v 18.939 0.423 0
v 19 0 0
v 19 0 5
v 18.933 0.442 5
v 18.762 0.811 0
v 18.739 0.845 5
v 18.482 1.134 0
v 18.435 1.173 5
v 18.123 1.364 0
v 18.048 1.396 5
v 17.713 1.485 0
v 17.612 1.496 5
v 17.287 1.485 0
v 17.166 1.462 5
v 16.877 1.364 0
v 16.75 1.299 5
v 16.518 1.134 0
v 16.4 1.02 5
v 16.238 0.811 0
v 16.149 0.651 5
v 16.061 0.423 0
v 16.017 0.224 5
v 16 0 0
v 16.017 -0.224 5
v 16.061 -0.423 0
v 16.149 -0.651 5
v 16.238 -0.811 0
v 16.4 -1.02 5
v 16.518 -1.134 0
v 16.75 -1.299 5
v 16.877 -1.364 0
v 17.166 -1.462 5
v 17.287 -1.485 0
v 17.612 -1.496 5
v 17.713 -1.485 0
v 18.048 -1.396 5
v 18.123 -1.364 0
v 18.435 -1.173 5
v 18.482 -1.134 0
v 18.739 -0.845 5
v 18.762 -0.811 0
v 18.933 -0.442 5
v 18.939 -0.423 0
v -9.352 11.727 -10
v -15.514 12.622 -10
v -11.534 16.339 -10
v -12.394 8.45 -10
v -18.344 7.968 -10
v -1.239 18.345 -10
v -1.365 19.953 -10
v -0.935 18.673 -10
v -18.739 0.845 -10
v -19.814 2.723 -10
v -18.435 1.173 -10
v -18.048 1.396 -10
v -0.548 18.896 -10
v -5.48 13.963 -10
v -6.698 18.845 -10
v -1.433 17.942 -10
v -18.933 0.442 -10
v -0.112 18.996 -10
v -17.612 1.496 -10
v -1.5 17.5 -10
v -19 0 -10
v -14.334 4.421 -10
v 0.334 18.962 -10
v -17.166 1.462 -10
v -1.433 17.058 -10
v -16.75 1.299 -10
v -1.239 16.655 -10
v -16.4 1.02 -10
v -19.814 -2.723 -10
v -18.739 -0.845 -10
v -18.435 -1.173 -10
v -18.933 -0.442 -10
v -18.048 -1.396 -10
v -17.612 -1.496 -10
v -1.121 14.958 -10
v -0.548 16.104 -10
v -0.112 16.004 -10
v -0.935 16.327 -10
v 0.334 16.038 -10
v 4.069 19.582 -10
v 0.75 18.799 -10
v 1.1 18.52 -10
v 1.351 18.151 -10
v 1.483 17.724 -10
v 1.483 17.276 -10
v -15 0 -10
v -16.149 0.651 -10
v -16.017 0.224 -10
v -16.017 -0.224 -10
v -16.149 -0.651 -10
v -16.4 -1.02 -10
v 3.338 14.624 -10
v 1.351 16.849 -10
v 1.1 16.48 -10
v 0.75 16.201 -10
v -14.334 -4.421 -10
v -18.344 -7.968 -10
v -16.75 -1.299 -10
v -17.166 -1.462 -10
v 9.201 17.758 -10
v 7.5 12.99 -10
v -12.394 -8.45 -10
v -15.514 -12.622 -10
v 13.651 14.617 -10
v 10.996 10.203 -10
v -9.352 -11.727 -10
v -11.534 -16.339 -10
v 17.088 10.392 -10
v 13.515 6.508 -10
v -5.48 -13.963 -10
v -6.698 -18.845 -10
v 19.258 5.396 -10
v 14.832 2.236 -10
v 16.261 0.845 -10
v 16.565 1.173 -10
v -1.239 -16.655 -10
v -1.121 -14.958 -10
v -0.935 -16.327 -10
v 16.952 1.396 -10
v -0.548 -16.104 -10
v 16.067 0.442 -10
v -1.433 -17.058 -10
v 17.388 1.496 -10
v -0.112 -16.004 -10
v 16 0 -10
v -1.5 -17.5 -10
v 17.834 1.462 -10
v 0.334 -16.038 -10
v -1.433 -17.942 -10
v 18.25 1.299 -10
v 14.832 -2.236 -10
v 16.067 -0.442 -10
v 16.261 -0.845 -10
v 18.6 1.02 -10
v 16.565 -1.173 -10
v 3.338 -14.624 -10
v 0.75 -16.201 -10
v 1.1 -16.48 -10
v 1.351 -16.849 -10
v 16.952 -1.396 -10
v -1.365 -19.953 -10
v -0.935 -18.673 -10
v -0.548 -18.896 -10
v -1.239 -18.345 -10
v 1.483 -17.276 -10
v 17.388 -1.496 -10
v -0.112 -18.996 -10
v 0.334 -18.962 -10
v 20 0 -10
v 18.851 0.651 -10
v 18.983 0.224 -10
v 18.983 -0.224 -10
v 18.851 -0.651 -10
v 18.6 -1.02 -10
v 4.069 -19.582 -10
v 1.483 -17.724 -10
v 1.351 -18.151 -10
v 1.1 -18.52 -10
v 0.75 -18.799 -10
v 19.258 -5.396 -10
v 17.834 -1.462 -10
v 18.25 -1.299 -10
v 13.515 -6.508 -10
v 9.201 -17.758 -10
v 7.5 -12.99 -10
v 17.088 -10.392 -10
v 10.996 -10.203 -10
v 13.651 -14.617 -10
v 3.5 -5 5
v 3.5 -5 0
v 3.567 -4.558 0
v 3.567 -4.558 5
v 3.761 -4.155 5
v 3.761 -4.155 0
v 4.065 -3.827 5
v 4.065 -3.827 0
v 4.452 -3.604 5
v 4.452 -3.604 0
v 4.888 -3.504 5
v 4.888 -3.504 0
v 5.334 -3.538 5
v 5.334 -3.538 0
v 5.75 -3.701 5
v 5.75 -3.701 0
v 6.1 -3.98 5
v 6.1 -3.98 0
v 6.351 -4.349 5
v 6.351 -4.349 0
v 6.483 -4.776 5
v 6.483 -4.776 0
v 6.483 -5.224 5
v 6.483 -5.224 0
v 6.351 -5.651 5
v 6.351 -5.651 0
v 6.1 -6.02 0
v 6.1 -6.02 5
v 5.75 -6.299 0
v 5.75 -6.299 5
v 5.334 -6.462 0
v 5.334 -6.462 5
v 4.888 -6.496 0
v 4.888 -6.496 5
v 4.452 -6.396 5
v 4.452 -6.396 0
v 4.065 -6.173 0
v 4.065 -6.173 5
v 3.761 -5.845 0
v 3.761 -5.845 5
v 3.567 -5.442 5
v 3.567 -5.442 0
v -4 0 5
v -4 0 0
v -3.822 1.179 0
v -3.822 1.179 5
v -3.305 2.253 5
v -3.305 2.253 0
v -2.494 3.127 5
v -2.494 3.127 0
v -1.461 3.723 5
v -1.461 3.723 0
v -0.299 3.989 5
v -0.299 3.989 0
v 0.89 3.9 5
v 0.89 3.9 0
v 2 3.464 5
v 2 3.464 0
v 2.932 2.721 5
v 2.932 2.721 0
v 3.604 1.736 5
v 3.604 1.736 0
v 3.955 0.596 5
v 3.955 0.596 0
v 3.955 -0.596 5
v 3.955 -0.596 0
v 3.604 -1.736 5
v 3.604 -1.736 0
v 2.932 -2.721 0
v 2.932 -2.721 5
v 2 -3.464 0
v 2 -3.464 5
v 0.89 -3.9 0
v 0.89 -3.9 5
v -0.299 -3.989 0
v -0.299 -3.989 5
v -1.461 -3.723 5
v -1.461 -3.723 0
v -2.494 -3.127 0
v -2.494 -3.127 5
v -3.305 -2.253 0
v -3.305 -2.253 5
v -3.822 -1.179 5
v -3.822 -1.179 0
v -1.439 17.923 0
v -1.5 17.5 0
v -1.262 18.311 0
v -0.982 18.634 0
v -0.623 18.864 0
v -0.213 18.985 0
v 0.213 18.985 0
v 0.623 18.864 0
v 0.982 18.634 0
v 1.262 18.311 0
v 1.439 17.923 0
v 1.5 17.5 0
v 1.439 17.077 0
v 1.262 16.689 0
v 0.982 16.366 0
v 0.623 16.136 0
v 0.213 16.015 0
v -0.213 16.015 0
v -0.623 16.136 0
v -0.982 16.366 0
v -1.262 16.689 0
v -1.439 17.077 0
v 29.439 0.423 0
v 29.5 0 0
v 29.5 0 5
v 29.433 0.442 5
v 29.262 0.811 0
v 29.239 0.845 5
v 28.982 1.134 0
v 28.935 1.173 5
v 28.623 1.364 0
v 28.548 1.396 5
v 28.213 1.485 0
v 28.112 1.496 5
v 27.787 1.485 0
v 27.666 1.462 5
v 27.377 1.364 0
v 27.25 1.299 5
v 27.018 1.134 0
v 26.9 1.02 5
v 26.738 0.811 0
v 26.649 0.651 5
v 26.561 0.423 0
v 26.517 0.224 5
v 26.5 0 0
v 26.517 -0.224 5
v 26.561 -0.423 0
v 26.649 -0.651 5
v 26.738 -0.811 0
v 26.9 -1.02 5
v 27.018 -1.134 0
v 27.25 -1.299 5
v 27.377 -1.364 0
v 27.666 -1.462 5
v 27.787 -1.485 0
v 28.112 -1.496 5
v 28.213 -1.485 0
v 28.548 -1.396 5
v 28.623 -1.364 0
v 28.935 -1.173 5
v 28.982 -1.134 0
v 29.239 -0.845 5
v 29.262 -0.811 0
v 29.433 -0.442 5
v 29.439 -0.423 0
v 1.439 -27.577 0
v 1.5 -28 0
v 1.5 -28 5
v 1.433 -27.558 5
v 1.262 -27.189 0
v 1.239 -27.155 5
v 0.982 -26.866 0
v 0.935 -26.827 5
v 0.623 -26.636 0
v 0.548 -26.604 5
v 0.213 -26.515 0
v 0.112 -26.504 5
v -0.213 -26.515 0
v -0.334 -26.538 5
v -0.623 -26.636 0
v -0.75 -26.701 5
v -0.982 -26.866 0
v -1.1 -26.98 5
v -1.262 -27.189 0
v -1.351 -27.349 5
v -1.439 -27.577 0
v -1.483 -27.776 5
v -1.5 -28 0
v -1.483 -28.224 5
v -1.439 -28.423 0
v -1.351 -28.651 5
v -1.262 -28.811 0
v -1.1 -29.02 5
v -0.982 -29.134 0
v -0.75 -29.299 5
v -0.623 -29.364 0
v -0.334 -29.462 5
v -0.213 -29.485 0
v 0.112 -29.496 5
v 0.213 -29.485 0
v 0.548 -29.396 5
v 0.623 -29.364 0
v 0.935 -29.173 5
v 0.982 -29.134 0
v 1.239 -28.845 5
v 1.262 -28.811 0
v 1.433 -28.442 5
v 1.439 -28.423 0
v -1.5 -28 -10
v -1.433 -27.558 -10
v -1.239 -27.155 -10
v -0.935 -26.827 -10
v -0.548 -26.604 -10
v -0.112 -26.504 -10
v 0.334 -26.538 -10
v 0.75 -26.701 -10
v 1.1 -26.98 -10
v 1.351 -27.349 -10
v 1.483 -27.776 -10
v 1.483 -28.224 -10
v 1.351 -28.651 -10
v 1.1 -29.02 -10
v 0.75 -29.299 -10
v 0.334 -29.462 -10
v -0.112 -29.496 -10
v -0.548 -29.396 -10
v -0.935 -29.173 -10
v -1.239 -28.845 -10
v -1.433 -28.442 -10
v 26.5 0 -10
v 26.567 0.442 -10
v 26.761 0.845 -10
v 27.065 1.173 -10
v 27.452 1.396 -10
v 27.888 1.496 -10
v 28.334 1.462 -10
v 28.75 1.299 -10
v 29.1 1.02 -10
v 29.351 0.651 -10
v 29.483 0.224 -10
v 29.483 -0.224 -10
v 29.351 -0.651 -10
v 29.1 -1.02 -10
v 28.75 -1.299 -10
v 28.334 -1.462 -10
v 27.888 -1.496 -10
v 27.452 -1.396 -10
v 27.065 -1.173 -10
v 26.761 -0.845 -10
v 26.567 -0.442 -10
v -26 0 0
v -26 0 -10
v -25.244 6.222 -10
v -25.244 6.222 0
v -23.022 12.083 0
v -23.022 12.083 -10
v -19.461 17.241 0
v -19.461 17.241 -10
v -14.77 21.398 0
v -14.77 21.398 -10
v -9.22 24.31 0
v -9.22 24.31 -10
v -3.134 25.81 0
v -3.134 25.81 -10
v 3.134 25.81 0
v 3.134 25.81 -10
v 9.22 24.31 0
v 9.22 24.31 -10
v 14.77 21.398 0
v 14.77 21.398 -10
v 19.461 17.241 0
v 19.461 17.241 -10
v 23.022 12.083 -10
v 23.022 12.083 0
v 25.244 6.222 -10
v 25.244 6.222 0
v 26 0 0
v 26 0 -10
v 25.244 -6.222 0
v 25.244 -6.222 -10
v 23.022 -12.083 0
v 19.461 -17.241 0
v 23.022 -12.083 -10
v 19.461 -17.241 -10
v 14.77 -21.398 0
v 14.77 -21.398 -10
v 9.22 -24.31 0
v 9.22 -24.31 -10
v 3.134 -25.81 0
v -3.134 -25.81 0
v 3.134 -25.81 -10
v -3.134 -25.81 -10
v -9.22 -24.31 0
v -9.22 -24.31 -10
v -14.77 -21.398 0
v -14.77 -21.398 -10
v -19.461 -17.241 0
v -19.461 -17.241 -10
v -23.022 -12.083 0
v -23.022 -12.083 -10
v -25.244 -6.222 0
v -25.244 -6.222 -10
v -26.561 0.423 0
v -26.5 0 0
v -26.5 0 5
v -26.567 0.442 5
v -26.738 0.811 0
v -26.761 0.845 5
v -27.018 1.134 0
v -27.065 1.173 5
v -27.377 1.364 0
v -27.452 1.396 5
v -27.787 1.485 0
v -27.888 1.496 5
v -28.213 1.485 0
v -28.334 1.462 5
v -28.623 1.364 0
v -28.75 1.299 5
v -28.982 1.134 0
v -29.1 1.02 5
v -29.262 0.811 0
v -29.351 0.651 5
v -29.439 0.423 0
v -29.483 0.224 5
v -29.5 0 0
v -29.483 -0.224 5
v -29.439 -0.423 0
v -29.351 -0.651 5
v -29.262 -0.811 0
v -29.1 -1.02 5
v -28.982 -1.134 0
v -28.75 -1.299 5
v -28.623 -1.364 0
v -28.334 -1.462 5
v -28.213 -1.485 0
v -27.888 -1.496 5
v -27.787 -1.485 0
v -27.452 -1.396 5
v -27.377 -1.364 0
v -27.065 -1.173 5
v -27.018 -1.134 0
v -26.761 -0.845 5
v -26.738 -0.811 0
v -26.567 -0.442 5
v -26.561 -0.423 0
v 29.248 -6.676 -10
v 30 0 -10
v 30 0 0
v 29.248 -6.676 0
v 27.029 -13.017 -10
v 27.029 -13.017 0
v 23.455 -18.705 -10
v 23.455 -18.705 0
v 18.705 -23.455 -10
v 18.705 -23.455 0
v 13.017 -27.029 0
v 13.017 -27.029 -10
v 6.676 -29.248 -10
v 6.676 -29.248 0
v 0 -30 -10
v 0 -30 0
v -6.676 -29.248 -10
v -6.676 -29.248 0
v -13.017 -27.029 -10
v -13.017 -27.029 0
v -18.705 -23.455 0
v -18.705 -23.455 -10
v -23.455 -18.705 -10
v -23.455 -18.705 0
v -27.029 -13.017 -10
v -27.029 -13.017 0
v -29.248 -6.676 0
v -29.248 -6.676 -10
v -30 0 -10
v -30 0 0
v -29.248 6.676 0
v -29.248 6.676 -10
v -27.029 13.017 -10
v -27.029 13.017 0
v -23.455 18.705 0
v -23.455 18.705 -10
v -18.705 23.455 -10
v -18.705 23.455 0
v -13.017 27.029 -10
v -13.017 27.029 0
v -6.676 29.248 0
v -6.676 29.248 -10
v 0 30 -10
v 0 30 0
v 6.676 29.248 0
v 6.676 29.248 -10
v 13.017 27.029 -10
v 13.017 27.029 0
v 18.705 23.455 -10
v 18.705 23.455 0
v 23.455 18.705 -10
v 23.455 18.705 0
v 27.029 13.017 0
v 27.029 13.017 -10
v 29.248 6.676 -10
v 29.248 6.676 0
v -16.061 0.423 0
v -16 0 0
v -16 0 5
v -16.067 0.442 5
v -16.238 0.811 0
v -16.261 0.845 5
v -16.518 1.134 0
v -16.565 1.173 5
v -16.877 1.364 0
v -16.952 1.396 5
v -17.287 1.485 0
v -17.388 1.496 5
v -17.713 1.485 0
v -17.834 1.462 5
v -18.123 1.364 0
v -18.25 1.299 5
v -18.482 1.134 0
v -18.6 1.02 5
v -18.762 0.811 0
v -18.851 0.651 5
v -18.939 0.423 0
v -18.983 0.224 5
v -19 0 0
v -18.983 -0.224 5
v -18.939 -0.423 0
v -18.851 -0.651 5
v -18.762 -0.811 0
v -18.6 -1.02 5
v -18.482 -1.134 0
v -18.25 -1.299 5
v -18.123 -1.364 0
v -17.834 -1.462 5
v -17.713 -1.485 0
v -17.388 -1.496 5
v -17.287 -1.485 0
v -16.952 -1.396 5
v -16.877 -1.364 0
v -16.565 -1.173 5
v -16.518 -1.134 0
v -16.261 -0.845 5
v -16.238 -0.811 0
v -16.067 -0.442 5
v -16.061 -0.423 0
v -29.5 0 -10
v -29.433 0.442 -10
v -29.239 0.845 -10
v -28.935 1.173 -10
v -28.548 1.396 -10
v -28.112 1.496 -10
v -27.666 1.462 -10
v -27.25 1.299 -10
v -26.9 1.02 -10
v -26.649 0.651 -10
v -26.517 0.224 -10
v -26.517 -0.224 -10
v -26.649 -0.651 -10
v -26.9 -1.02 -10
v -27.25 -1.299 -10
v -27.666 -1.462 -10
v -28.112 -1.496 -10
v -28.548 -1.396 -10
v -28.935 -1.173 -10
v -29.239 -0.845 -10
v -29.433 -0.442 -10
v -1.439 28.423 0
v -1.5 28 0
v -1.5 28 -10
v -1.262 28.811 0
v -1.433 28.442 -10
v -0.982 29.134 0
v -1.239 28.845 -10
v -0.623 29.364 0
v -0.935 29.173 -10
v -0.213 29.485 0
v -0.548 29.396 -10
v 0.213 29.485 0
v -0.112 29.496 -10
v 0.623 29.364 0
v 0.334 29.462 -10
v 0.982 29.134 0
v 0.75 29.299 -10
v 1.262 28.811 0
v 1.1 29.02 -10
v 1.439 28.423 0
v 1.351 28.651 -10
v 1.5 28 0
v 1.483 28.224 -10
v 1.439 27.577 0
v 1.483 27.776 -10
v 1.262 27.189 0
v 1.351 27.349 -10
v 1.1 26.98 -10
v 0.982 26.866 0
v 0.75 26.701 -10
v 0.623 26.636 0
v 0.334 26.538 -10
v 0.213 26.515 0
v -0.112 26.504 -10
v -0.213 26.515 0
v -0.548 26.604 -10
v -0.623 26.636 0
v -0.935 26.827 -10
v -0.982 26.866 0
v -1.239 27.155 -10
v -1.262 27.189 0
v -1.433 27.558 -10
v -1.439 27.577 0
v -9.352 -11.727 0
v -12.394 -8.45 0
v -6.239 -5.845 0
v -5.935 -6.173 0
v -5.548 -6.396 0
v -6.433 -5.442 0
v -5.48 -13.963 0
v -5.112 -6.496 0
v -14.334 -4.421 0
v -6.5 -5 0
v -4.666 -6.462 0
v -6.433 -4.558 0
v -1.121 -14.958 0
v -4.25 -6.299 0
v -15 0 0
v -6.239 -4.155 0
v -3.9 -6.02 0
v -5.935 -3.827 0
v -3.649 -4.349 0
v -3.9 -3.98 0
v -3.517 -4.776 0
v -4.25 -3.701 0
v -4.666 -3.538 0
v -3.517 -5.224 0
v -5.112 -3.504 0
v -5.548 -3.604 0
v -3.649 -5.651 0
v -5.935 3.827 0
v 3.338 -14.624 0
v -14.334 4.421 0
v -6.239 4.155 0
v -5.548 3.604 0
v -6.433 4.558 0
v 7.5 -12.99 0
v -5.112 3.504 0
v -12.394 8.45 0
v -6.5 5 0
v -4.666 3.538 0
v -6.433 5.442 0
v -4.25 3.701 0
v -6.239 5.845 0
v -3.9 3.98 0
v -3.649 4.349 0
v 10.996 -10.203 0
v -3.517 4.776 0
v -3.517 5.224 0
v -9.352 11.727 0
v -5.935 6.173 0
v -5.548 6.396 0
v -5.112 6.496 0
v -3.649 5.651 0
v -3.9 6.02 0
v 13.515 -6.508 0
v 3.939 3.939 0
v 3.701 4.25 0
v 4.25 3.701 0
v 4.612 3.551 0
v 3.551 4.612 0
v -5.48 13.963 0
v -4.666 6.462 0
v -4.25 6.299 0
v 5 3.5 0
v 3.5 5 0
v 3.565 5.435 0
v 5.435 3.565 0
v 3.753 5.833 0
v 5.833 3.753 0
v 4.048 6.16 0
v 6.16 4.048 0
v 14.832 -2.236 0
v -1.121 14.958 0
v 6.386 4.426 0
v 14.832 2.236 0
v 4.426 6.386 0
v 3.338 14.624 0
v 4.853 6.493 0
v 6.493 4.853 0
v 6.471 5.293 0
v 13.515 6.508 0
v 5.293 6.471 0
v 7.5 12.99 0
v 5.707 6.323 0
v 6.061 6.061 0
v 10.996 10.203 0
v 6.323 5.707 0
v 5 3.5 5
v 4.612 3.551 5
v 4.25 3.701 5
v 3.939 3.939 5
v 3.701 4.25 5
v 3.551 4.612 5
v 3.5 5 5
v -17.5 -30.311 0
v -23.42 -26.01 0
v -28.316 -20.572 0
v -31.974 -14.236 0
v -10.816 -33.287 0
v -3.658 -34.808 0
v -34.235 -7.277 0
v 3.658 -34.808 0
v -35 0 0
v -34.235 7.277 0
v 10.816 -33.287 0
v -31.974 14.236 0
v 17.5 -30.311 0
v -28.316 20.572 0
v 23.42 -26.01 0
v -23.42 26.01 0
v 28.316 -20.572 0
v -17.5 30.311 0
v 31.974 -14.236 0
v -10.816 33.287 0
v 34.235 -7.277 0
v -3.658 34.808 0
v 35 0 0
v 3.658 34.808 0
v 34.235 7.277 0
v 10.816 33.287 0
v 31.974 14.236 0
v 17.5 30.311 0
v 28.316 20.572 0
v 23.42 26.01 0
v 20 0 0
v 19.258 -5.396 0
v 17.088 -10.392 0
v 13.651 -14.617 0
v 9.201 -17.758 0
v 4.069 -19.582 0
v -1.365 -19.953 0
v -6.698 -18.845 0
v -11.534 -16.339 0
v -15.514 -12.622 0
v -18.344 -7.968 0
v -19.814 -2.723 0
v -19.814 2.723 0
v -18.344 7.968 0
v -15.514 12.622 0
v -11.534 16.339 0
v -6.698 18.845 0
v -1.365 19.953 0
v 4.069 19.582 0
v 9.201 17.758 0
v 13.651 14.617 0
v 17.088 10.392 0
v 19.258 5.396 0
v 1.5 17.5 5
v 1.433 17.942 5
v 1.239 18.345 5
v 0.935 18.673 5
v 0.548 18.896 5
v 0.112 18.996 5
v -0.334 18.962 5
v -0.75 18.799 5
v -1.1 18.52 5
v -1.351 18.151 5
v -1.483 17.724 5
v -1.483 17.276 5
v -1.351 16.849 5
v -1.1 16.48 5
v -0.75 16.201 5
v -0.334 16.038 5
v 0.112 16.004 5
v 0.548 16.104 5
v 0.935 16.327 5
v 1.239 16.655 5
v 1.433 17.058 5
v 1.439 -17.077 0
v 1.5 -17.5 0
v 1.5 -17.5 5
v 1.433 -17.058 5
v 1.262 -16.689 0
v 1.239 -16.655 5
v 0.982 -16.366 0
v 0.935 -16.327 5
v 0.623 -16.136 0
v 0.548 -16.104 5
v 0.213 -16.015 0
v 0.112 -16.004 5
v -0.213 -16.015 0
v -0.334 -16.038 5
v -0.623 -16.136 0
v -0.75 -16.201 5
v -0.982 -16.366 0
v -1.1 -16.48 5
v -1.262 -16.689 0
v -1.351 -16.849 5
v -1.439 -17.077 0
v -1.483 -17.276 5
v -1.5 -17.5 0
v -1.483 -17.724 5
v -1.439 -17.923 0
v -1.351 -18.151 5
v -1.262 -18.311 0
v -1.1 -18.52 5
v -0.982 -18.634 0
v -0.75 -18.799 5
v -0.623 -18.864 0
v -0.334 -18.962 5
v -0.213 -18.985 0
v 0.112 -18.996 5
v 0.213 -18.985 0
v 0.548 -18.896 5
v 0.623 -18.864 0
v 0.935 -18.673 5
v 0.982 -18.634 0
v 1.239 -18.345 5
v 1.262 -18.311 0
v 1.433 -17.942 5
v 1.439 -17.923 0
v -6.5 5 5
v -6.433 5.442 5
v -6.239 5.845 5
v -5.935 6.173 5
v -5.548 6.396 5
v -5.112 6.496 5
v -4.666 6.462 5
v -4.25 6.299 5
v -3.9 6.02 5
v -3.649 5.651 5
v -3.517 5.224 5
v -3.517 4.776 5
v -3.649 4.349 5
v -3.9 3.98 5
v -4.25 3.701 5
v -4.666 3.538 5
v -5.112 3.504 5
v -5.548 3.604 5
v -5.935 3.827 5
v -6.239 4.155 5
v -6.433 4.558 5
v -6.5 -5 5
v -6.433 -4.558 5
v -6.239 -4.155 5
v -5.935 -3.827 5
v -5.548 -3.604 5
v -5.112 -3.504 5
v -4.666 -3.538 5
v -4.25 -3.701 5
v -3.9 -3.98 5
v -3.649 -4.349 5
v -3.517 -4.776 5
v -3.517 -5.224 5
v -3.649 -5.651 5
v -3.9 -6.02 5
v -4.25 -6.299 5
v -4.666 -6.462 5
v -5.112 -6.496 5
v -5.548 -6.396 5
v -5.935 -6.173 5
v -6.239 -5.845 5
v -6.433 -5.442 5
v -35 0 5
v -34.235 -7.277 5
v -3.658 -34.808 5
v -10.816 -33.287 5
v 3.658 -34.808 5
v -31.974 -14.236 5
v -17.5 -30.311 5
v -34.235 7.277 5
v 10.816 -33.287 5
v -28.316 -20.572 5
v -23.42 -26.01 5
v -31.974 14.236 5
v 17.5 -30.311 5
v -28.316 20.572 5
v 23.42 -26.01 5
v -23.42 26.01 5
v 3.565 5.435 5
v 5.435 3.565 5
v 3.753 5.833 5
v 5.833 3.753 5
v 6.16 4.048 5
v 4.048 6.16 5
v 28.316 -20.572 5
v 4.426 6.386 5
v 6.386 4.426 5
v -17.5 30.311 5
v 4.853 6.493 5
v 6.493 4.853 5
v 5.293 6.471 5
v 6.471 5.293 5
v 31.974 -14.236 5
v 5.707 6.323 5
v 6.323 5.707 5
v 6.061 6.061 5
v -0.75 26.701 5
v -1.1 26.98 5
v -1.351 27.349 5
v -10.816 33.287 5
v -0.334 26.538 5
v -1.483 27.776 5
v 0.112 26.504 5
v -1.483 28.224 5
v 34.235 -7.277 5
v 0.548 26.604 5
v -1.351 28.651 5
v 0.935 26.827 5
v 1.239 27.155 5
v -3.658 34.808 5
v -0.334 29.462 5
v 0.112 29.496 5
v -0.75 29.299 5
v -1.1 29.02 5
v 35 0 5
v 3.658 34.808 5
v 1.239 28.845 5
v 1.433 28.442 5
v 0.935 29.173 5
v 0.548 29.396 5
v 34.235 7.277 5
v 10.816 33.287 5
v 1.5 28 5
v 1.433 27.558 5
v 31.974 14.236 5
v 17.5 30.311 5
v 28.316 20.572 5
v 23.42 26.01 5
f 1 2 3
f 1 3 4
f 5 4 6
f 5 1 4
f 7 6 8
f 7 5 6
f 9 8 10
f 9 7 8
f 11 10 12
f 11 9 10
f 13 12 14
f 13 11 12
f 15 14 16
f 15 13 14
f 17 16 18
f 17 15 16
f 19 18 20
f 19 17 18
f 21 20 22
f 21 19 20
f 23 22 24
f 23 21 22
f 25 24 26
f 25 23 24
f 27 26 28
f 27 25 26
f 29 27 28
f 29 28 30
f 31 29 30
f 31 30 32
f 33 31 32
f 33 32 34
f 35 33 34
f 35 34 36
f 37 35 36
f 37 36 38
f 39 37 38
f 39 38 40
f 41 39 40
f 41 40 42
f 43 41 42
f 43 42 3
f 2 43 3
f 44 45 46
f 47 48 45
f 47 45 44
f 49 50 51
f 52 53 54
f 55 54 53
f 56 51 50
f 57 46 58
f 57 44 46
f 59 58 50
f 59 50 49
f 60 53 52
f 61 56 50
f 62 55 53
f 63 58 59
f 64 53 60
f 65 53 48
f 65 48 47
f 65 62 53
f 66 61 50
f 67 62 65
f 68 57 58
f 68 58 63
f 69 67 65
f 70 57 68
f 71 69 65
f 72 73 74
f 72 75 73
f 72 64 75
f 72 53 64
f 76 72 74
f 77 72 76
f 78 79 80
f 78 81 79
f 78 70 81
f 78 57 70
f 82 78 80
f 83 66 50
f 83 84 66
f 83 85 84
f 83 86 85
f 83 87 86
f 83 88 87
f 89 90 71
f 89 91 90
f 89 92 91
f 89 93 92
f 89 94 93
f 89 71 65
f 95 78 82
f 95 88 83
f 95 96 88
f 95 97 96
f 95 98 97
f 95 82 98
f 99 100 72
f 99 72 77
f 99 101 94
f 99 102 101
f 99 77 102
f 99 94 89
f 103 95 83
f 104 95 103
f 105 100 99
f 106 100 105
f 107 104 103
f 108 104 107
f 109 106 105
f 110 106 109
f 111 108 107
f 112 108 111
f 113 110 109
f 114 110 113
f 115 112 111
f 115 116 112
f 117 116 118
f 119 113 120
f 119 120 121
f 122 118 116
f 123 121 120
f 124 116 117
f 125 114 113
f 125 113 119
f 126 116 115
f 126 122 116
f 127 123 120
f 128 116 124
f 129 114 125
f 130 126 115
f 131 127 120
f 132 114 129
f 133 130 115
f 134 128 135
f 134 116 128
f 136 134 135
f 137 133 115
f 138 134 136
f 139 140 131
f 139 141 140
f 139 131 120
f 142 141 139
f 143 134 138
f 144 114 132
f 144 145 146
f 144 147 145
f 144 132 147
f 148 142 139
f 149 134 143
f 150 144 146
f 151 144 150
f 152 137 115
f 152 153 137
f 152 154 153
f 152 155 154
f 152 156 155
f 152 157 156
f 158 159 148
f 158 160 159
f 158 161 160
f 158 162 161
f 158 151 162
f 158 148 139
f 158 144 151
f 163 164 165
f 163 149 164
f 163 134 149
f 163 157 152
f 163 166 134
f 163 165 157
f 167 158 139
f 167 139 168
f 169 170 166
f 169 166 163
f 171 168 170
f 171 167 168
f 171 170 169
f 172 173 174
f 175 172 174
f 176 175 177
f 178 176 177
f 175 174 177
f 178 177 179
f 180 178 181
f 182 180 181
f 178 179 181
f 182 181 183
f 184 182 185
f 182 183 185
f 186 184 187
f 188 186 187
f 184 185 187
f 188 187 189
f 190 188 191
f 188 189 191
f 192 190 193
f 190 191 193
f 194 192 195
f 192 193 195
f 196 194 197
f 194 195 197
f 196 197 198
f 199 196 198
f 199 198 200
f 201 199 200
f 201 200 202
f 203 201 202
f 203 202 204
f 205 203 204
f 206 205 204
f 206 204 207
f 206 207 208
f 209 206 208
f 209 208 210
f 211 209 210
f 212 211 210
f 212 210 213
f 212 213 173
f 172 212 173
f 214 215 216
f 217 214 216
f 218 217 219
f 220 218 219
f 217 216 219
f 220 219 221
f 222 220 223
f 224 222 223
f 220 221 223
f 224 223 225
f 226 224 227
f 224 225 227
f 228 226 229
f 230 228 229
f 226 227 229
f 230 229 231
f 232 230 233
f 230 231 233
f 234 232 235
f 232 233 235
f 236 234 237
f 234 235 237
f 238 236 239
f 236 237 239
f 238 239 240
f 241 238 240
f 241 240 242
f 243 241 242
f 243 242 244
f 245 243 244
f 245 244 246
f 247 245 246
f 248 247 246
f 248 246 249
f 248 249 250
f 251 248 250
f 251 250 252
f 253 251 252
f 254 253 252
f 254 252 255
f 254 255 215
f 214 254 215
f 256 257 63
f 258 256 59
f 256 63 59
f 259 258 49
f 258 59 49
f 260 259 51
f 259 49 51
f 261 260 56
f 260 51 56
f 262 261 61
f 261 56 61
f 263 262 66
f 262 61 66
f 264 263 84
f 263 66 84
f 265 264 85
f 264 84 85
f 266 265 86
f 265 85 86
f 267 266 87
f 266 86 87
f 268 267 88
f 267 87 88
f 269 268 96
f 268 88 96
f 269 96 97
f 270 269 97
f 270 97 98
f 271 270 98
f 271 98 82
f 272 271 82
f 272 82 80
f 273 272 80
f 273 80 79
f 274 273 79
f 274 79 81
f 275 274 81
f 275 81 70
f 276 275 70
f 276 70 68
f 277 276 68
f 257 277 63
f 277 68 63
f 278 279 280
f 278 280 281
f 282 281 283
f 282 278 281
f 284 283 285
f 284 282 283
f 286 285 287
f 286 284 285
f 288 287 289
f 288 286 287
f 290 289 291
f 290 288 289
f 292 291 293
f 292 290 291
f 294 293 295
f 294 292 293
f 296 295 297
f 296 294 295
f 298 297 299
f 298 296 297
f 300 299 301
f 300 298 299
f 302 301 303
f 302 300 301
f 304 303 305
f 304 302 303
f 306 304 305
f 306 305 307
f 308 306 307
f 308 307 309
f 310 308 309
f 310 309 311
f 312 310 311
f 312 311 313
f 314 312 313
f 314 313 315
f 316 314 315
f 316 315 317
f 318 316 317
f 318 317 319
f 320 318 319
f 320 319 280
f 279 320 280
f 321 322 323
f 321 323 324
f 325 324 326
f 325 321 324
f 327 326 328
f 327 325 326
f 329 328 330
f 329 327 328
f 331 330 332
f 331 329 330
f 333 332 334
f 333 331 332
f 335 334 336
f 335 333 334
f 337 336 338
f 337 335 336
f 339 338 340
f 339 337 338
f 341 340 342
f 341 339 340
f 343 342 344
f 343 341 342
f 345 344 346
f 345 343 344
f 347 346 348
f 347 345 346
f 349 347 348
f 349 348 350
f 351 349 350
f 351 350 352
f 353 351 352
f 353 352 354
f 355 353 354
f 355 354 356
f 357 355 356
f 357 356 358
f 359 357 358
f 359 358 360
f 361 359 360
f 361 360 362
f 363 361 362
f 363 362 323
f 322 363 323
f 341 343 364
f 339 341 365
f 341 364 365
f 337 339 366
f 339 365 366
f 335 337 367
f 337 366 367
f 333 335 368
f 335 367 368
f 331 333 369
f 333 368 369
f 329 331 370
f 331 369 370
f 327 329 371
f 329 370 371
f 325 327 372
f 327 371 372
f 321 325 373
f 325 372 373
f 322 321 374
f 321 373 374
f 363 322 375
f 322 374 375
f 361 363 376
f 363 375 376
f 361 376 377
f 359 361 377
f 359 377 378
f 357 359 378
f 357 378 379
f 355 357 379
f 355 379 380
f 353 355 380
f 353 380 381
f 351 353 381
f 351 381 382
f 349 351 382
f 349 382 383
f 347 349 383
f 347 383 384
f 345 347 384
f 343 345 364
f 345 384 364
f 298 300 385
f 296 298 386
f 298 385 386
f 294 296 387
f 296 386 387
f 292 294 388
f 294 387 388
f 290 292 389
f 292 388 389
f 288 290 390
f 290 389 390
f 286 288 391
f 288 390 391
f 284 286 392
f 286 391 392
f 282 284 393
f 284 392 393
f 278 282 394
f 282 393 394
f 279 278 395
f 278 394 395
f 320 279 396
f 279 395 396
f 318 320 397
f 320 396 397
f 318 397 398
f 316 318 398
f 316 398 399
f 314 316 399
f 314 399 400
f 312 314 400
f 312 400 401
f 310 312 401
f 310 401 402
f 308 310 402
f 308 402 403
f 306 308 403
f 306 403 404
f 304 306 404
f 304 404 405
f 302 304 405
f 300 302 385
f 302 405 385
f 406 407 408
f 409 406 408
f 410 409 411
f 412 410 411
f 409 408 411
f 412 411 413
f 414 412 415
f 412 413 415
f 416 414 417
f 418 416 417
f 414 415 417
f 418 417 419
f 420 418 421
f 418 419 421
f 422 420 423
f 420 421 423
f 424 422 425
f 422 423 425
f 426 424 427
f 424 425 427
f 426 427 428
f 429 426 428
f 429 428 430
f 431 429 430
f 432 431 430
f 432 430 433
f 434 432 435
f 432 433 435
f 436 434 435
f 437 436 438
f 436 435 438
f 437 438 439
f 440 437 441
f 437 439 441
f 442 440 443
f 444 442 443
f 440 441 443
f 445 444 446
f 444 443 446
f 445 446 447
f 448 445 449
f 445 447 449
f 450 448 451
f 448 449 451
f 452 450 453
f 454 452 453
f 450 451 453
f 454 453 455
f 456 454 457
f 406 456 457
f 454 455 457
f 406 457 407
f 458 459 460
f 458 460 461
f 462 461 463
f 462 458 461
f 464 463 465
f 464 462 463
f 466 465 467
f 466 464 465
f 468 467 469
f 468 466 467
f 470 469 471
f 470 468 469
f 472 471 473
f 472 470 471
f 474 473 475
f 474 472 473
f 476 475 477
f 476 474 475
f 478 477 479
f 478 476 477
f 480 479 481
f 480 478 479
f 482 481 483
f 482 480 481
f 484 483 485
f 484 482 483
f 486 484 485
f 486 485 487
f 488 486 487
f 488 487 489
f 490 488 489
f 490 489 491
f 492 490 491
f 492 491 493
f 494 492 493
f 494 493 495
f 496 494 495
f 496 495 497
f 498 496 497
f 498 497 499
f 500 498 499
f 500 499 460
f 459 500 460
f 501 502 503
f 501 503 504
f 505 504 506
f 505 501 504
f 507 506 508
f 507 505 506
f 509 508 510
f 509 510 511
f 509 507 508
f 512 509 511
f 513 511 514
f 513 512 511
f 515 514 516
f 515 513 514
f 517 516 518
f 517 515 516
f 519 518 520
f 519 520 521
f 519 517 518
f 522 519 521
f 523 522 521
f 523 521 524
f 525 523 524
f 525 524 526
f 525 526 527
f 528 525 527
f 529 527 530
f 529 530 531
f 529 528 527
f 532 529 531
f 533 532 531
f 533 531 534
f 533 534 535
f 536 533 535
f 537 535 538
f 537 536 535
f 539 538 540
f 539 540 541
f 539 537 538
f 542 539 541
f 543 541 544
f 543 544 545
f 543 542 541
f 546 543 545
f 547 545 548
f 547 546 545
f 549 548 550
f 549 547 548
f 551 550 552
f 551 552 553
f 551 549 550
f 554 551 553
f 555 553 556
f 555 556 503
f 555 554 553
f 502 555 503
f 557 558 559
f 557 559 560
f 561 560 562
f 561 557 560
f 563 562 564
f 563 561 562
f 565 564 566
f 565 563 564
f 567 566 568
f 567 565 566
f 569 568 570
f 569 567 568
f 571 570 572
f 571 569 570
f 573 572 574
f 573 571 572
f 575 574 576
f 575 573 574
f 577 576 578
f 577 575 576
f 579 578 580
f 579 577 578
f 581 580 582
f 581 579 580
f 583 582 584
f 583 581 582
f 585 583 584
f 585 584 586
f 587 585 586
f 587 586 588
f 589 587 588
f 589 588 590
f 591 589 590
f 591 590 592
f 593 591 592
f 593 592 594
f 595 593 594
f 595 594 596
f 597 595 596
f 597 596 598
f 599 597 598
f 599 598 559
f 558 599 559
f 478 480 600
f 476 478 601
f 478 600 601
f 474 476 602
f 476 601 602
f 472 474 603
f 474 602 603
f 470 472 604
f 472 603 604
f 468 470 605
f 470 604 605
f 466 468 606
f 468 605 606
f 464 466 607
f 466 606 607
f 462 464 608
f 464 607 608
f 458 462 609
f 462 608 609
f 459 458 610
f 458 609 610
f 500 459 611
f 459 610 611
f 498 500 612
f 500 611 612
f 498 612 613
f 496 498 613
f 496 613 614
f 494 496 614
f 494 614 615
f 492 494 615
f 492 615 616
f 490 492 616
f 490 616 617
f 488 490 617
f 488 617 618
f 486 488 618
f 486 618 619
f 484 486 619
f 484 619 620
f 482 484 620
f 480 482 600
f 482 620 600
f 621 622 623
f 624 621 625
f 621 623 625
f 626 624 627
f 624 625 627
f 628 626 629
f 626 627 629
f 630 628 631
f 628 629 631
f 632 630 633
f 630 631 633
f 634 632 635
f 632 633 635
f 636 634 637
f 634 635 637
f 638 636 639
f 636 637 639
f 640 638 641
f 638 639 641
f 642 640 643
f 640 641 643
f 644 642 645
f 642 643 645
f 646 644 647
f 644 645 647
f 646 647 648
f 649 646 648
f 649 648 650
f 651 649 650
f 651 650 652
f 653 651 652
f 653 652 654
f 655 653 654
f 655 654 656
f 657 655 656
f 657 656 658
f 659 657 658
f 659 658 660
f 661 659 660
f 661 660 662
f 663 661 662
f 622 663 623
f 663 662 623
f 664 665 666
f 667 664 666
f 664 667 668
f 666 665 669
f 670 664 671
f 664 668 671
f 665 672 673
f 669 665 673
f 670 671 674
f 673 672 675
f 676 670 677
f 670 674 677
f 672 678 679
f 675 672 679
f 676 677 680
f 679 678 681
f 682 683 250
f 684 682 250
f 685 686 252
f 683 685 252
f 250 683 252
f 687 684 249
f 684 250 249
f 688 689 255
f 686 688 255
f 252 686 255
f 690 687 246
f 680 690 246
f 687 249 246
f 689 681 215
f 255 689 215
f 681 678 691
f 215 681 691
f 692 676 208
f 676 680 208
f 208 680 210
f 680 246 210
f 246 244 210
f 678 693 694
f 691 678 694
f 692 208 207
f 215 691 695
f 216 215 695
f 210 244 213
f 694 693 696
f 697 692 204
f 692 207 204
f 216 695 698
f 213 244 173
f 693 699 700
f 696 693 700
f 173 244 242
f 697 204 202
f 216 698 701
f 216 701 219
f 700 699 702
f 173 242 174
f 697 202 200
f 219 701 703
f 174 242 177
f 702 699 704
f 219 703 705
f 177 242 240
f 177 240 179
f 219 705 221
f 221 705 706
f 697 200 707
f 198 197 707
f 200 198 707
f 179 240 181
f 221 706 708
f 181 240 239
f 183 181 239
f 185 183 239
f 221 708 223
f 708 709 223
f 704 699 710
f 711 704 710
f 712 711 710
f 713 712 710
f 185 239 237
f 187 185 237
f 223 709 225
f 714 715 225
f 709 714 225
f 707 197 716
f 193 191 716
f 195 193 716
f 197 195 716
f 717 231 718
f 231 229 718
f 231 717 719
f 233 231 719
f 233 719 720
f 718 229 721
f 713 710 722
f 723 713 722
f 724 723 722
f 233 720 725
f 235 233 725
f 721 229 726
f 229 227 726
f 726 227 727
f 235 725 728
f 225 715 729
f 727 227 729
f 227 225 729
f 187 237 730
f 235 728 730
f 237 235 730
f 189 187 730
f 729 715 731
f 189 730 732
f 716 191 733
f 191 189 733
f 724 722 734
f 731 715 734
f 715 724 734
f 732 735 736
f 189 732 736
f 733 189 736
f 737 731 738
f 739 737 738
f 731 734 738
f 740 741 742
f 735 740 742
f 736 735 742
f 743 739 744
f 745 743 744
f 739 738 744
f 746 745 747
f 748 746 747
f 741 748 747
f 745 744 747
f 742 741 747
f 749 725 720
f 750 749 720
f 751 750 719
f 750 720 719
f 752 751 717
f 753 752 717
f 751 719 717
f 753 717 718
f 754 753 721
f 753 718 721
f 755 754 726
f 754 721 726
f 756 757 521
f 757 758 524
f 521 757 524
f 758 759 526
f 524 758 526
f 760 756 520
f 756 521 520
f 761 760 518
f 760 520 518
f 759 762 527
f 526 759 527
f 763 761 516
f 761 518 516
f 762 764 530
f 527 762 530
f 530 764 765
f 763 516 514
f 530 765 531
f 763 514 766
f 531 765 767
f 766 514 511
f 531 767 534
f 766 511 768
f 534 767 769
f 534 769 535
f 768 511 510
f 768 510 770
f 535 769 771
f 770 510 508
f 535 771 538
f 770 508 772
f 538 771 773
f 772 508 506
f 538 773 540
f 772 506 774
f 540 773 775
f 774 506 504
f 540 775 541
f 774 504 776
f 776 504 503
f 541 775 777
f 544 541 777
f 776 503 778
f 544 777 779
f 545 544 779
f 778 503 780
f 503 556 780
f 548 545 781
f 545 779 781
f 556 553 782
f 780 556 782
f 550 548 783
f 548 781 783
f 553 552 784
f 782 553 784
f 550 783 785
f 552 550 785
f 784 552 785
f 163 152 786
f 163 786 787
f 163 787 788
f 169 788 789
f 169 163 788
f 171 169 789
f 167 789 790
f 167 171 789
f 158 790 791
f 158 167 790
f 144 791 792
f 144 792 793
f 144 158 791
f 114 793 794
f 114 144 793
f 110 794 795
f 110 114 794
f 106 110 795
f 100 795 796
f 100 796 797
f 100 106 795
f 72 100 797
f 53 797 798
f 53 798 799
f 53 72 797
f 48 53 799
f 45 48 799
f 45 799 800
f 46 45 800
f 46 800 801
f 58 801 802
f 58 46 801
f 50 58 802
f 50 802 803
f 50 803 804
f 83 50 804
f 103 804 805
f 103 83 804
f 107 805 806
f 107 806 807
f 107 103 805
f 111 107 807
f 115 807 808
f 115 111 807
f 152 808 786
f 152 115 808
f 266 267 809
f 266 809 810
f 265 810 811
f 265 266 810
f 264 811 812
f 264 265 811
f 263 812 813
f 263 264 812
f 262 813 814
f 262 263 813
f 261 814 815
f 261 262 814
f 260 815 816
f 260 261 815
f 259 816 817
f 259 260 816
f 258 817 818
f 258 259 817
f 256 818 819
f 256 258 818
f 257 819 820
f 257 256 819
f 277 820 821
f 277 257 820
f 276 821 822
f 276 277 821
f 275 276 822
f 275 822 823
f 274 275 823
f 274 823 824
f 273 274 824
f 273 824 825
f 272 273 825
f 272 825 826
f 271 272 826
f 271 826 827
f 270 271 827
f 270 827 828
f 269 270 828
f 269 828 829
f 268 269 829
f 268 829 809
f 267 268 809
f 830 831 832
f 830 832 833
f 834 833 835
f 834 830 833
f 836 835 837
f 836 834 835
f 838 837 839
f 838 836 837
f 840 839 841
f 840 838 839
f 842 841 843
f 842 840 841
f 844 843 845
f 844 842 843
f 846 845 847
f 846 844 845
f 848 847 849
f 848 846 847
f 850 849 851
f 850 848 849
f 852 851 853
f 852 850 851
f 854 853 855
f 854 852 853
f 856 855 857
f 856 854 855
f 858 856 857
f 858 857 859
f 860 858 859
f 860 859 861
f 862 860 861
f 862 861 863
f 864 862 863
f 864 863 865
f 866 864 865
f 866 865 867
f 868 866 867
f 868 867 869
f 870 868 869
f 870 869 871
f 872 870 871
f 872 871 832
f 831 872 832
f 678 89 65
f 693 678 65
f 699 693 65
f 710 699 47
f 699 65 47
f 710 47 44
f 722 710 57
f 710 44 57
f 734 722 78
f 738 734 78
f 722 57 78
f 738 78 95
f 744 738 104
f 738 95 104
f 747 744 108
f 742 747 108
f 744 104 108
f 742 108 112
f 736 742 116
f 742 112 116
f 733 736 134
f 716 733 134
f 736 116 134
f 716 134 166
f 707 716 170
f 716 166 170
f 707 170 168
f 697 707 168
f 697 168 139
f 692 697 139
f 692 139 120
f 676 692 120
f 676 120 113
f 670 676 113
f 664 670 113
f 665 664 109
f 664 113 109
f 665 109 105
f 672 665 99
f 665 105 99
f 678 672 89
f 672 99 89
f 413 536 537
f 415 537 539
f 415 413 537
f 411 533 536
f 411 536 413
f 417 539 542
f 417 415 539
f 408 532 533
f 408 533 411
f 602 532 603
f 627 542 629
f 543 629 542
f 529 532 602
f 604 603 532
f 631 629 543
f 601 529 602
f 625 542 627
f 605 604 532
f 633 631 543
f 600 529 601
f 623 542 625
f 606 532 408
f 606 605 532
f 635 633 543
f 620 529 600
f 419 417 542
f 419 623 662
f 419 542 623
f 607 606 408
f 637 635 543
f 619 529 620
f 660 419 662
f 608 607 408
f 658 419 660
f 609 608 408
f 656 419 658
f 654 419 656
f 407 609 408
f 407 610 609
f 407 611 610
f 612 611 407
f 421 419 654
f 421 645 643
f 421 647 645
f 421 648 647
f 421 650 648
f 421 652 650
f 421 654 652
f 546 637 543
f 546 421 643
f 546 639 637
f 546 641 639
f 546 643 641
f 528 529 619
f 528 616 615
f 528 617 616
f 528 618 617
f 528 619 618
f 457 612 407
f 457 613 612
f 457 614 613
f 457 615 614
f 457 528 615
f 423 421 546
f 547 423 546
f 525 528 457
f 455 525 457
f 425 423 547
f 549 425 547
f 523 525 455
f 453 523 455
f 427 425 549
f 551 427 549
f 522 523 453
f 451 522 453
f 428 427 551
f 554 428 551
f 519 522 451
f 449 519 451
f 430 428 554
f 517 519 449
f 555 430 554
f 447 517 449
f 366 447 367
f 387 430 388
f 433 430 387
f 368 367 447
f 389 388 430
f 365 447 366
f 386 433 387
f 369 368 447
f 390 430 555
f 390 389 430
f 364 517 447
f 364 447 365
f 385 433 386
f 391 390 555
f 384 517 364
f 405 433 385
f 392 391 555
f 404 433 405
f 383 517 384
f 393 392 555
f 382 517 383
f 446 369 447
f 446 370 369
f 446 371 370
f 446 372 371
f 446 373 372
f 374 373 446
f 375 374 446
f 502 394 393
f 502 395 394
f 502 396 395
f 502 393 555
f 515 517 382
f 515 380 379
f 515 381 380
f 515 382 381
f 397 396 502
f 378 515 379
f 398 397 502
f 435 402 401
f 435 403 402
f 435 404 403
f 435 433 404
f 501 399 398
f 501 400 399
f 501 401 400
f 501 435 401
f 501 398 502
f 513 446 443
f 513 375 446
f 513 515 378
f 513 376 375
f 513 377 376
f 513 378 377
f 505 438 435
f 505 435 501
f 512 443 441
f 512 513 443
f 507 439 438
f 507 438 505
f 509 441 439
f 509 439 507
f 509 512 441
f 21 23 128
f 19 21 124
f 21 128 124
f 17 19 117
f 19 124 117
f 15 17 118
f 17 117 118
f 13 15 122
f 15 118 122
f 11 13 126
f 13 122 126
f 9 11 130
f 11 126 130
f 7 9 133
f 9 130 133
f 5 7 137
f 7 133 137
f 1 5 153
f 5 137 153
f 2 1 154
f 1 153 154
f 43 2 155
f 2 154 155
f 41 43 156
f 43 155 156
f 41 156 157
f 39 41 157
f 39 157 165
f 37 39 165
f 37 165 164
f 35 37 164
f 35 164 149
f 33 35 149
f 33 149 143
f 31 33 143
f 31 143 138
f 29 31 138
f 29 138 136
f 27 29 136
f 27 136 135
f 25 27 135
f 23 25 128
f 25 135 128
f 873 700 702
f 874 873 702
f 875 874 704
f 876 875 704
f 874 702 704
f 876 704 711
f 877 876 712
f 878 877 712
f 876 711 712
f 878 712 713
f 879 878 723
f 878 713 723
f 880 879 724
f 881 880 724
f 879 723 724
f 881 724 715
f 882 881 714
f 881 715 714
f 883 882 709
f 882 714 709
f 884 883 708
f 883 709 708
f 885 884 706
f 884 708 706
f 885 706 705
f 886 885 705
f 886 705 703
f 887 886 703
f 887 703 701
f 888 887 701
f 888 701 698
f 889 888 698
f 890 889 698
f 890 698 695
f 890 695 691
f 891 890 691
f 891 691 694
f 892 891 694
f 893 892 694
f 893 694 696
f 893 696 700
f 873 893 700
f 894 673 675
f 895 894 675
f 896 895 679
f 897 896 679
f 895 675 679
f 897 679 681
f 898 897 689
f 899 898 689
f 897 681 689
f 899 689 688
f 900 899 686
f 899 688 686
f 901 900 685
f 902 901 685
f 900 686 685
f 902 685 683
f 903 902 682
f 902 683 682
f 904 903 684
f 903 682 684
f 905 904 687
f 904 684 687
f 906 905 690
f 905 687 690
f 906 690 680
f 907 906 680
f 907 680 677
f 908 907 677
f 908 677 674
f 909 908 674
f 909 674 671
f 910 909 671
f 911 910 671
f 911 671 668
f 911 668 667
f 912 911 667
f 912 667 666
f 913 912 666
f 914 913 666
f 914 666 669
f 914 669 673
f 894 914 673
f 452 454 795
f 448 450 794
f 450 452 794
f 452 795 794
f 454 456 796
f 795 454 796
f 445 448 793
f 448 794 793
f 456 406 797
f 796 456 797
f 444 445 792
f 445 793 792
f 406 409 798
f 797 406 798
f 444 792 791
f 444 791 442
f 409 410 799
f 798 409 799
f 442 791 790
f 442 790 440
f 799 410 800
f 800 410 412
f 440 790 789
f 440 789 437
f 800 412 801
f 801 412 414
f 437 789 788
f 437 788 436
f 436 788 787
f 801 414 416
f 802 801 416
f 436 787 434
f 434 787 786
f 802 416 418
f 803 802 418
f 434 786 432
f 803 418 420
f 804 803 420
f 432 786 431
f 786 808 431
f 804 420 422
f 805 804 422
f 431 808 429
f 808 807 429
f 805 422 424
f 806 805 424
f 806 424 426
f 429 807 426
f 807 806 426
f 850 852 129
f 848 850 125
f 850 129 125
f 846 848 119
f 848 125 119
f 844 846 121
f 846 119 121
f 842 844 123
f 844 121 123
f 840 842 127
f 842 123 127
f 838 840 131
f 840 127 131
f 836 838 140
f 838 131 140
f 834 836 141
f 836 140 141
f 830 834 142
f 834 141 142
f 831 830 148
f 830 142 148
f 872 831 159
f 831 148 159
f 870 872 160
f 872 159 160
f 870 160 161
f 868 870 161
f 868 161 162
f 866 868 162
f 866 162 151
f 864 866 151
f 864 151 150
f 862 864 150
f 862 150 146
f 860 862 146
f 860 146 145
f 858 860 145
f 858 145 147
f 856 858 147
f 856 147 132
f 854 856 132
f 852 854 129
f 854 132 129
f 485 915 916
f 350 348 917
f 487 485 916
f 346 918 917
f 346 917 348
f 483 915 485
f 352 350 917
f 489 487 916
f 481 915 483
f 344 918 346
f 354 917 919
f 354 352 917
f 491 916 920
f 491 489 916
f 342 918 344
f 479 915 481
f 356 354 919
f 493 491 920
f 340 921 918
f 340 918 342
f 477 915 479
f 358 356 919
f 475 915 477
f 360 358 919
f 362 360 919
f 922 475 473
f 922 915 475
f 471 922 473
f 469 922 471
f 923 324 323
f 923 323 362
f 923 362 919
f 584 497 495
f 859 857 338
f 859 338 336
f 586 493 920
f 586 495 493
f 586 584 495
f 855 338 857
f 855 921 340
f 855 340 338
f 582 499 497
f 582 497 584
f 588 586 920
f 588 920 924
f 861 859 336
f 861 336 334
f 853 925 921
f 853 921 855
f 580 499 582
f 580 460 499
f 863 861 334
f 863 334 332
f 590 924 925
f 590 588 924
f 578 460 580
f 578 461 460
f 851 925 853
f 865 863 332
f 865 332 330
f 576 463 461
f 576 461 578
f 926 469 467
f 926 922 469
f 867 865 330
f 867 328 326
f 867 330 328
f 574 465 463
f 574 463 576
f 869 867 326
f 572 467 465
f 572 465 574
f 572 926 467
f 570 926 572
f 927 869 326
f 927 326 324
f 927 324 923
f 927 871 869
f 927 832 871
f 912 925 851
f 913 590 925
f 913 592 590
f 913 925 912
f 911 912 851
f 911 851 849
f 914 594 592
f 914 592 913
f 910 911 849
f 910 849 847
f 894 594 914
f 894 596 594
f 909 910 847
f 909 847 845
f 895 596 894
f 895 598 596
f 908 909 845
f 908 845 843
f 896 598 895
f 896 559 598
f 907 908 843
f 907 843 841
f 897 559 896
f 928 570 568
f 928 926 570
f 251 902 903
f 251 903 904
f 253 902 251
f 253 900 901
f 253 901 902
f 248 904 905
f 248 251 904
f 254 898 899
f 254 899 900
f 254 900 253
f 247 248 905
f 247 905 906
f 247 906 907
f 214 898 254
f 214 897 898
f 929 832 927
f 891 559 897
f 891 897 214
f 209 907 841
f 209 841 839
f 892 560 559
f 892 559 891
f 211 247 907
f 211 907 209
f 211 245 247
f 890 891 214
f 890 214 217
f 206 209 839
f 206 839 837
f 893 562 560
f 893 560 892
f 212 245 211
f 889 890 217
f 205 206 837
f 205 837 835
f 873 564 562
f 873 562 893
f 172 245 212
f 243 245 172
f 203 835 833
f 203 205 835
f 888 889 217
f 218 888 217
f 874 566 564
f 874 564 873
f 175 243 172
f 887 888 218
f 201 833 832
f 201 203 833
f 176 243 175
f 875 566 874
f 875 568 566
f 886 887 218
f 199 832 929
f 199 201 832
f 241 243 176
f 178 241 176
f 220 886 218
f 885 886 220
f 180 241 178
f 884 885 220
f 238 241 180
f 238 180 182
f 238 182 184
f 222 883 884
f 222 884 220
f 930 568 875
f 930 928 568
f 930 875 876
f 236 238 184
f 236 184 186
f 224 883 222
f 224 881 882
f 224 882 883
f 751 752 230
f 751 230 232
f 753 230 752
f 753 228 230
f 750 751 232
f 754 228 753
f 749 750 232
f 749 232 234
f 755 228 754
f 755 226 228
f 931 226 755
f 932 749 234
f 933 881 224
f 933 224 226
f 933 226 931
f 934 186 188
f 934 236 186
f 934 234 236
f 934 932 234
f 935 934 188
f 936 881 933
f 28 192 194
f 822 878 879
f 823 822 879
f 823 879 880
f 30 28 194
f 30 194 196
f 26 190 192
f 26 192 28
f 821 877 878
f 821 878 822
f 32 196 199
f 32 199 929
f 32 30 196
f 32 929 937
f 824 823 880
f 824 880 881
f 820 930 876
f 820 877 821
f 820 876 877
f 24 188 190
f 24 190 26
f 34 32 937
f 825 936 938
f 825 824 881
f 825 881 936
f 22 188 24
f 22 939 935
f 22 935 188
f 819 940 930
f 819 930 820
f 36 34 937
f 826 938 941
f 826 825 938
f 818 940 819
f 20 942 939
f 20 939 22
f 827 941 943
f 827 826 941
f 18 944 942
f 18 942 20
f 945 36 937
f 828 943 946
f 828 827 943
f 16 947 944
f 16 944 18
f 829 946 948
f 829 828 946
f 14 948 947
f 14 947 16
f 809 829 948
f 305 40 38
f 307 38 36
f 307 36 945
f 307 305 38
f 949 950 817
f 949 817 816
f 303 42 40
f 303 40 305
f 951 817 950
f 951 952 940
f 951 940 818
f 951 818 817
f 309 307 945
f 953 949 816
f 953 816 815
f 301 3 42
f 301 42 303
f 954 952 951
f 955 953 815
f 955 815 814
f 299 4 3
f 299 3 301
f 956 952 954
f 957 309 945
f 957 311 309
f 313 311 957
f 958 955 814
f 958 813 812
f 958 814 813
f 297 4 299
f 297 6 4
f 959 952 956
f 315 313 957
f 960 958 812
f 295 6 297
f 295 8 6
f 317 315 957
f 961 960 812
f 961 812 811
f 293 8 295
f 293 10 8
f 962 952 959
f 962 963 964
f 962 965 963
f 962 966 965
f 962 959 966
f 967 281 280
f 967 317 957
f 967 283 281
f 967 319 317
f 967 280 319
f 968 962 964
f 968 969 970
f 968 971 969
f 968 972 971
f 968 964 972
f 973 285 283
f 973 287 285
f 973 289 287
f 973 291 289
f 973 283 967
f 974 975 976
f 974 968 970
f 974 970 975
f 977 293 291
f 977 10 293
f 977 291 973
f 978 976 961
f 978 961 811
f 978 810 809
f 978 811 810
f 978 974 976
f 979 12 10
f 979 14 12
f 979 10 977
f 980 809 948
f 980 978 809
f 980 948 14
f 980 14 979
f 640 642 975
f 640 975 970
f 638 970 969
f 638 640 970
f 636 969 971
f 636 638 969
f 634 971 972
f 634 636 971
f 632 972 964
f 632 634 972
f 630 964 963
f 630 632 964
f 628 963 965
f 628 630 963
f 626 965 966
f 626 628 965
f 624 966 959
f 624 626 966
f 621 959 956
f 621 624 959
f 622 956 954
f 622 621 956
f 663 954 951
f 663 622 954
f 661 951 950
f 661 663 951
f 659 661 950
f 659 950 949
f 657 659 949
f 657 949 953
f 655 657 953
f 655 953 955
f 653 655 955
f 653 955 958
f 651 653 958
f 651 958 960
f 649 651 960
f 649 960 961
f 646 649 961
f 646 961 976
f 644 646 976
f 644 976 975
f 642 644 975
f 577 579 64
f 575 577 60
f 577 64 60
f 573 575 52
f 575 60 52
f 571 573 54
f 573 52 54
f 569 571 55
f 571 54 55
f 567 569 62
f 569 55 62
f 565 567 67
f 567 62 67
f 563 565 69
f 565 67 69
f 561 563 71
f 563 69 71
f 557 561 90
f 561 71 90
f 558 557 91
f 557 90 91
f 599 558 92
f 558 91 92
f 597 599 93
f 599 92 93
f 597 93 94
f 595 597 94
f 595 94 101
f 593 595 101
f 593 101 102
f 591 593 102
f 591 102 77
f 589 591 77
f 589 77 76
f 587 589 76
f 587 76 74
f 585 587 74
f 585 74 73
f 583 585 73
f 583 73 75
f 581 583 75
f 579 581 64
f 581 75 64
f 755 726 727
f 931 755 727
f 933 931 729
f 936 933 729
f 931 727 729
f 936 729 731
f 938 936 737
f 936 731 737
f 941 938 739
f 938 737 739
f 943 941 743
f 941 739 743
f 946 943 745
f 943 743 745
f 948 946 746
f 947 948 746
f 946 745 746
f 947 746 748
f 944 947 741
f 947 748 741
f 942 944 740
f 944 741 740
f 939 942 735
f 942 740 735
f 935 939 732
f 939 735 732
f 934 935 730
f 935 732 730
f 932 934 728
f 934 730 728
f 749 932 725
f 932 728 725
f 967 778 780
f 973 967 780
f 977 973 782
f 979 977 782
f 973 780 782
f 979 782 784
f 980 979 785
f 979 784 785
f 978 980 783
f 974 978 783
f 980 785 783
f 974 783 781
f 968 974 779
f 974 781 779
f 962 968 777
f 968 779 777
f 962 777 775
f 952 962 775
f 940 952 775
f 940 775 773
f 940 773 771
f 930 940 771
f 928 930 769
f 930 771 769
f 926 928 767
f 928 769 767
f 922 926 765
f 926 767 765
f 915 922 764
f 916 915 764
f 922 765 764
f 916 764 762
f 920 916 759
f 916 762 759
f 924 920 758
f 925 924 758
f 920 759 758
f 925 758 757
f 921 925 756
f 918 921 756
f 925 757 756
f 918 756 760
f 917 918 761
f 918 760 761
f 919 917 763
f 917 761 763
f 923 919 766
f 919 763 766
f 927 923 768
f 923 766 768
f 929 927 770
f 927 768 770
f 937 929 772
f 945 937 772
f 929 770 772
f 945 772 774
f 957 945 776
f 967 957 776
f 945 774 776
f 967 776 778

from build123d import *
from build123d.topology import SkipClean

# Parameters (mm, degrees)
SKETCH_1_R          = 35
SKETCH_1_R_2        = 30
SKETCH_1_R_3        = 1.5
SKETCH_1_R_4        = 26
SKETCH_1_R_5        = 20
SKETCH_1_R_6        = 15
SKETCH_1_R_7        = 12.5
EXTRUDE_1_DEPTH     = 5
EXTRUDE_START       = 10
SKETCH_2_R          = 30
SKETCH_2_R_2        = 26
SKETCH_2_R_3        = 1.5
SKETCH_2_R_4        = 20
SKETCH_2_R_5        = 15
EXTRUDE_2_DEPTH     = 10
SKETCH_3_R          = 4
SKETCH_3_R_2        = 1.5
CUT_EXTRUDE_1_DEPTH = 10


with BuildPart() as part:
    # 草图1 → 凸台-拉伸1 (new body)
    # profile 1 of 6: a face of its own
    with BuildSketch(Plane.XY):
        Circle(SKETCH_1_R)
        Circle(SKETCH_1_R_2, mode=Mode.SUBTRACT)
    # profile 2 of 6: a face of its own
    with BuildSketch(Plane.XY):
        Circle(SKETCH_1_R_2)
        with Locations((-28, 0)):
            Circle(SKETCH_1_R_3, mode=Mode.SUBTRACT)
        with Locations((0, -28)):
            Circle(SKETCH_1_R_3, mode=Mode.SUBTRACT)
        with Locations((28, 0)):
            Circle(SKETCH_1_R_3, mode=Mode.SUBTRACT)
        with Locations((0, 28)):
            Circle(SKETCH_1_R_3, mode=Mode.SUBTRACT)
        Circle(SKETCH_1_R_4, mode=Mode.SUBTRACT)
    # profile 3 of 6: a face of its own
    with BuildSketch(Plane.XY):
        Circle(SKETCH_1_R_4)
        Circle(SKETCH_1_R_5, mode=Mode.SUBTRACT)
    # profile 4 of 6: a face of its own
    with BuildSketch(Plane.XY):
        Circle(SKETCH_1_R_5)
        with Locations((-17.5, 0)):
            Circle(SKETCH_1_R_3, mode=Mode.SUBTRACT)
        with Locations((0, -17.5)):
            Circle(SKETCH_1_R_3, mode=Mode.SUBTRACT)
        with Locations((17.5, 0)):
            Circle(SKETCH_1_R_3, mode=Mode.SUBTRACT)
        with Locations((0, 17.5)):
            Circle(SKETCH_1_R_3, mode=Mode.SUBTRACT)
        Circle(SKETCH_1_R_6, mode=Mode.SUBTRACT)
    # profile 5 of 6: a face of its own
    with BuildSketch(Plane.XY):
        Circle(SKETCH_1_R_6)
        Circle(SKETCH_1_R_7, mode=Mode.SUBTRACT)
    # profile 6 of 6: a face of its own
    with BuildSketch(Plane.XY):
        Circle(SKETCH_1_R_7)
    extrude(amount=EXTRUDE_1_DEPTH)

    # 草图2 → 凸台-拉伸2 (add)
    # profile 1 of 2: a face of its own
    with SkipClean():  # the faces are left unmerged after this step: merging them gives an invalid solid
        with BuildSketch(Plane(origin=(0, 0, 0), x_dir=(-1, 0, 0), z_dir=(0, 0, -1)).offset(EXTRUDE_START)):
            with Locations(Location((0, 0, 0), (0, 0, 180))):
                Circle(SKETCH_2_R)
            Circle(SKETCH_2_R_2, mode=Mode.SUBTRACT)
            with Locations((0, -28)):
                Circle(SKETCH_2_R_3, mode=Mode.SUBTRACT)
            with Locations((0, 28)):
                Circle(SKETCH_2_R_3, mode=Mode.SUBTRACT)
            with Locations((-28, 0)):
                Circle(SKETCH_2_R_3, mode=Mode.SUBTRACT)
            with Locations((28, 0)):
                Circle(SKETCH_2_R_3, mode=Mode.SUBTRACT)
        # profile 2 of 2: a face of its own
        with BuildSketch(Plane(origin=(0, 0, 0), x_dir=(-1, 0, 0), z_dir=(0, 0, -1)).offset(EXTRUDE_START)):
            with Locations(Location((0, 0, 0), (0, 0, 180))):
                Circle(SKETCH_2_R_4)
            Circle(SKETCH_2_R_5, mode=Mode.SUBTRACT)
            with Locations((17.5, 0)):
                Circle(SKETCH_2_R_3, mode=Mode.SUBTRACT)
            with Locations((-17.5, 0)):
                Circle(SKETCH_2_R_3, mode=Mode.SUBTRACT)
            with Locations((0, 17.5)):
                Circle(SKETCH_2_R_3, mode=Mode.SUBTRACT)
            with Locations((0, -17.5)):
                Circle(SKETCH_2_R_3, mode=Mode.SUBTRACT)
        extrude(amount=-EXTRUDE_2_DEPTH)

    # 草图3 → 切除-拉伸1 (cut)
    with SkipClean():  # the faces are left unmerged after this step: merging them gives an invalid solid
        with BuildSketch(Plane(origin=(0, 0, 0), x_dir=(-1, 0, 0), z_dir=(0, 0, -1))):
            with BuildLine():
                ThreePointArc((-3.5, 5), (-6.060660172, 6.060660172), (-5, 3.5))
                Line((-5, 3.5), (-5, 5))
                Line((-5, 5), (-3.5, 5))
            make_face()
            with BuildLine():
                Line((-5, 5), (-5, 3.5))
                ThreePointArc((-5, 3.5), (-3.939339828, 3.939339828), (-3.5, 5))
                Line((-3.5, 5), (-5, 5))
            make_face()
            Circle(SKETCH_3_R)
            with Locations((-5, -5)):
                Circle(SKETCH_3_R_2)
            with Locations((5, -5)):
                Circle(SKETCH_3_R_2)
            with Locations((5, 5)):
                Circle(SKETCH_3_R_2)
        extrude(amount=-CUT_EXTRUDE_1_DEPTH, mode=Mode.SUBTRACT)


solid = part.part
